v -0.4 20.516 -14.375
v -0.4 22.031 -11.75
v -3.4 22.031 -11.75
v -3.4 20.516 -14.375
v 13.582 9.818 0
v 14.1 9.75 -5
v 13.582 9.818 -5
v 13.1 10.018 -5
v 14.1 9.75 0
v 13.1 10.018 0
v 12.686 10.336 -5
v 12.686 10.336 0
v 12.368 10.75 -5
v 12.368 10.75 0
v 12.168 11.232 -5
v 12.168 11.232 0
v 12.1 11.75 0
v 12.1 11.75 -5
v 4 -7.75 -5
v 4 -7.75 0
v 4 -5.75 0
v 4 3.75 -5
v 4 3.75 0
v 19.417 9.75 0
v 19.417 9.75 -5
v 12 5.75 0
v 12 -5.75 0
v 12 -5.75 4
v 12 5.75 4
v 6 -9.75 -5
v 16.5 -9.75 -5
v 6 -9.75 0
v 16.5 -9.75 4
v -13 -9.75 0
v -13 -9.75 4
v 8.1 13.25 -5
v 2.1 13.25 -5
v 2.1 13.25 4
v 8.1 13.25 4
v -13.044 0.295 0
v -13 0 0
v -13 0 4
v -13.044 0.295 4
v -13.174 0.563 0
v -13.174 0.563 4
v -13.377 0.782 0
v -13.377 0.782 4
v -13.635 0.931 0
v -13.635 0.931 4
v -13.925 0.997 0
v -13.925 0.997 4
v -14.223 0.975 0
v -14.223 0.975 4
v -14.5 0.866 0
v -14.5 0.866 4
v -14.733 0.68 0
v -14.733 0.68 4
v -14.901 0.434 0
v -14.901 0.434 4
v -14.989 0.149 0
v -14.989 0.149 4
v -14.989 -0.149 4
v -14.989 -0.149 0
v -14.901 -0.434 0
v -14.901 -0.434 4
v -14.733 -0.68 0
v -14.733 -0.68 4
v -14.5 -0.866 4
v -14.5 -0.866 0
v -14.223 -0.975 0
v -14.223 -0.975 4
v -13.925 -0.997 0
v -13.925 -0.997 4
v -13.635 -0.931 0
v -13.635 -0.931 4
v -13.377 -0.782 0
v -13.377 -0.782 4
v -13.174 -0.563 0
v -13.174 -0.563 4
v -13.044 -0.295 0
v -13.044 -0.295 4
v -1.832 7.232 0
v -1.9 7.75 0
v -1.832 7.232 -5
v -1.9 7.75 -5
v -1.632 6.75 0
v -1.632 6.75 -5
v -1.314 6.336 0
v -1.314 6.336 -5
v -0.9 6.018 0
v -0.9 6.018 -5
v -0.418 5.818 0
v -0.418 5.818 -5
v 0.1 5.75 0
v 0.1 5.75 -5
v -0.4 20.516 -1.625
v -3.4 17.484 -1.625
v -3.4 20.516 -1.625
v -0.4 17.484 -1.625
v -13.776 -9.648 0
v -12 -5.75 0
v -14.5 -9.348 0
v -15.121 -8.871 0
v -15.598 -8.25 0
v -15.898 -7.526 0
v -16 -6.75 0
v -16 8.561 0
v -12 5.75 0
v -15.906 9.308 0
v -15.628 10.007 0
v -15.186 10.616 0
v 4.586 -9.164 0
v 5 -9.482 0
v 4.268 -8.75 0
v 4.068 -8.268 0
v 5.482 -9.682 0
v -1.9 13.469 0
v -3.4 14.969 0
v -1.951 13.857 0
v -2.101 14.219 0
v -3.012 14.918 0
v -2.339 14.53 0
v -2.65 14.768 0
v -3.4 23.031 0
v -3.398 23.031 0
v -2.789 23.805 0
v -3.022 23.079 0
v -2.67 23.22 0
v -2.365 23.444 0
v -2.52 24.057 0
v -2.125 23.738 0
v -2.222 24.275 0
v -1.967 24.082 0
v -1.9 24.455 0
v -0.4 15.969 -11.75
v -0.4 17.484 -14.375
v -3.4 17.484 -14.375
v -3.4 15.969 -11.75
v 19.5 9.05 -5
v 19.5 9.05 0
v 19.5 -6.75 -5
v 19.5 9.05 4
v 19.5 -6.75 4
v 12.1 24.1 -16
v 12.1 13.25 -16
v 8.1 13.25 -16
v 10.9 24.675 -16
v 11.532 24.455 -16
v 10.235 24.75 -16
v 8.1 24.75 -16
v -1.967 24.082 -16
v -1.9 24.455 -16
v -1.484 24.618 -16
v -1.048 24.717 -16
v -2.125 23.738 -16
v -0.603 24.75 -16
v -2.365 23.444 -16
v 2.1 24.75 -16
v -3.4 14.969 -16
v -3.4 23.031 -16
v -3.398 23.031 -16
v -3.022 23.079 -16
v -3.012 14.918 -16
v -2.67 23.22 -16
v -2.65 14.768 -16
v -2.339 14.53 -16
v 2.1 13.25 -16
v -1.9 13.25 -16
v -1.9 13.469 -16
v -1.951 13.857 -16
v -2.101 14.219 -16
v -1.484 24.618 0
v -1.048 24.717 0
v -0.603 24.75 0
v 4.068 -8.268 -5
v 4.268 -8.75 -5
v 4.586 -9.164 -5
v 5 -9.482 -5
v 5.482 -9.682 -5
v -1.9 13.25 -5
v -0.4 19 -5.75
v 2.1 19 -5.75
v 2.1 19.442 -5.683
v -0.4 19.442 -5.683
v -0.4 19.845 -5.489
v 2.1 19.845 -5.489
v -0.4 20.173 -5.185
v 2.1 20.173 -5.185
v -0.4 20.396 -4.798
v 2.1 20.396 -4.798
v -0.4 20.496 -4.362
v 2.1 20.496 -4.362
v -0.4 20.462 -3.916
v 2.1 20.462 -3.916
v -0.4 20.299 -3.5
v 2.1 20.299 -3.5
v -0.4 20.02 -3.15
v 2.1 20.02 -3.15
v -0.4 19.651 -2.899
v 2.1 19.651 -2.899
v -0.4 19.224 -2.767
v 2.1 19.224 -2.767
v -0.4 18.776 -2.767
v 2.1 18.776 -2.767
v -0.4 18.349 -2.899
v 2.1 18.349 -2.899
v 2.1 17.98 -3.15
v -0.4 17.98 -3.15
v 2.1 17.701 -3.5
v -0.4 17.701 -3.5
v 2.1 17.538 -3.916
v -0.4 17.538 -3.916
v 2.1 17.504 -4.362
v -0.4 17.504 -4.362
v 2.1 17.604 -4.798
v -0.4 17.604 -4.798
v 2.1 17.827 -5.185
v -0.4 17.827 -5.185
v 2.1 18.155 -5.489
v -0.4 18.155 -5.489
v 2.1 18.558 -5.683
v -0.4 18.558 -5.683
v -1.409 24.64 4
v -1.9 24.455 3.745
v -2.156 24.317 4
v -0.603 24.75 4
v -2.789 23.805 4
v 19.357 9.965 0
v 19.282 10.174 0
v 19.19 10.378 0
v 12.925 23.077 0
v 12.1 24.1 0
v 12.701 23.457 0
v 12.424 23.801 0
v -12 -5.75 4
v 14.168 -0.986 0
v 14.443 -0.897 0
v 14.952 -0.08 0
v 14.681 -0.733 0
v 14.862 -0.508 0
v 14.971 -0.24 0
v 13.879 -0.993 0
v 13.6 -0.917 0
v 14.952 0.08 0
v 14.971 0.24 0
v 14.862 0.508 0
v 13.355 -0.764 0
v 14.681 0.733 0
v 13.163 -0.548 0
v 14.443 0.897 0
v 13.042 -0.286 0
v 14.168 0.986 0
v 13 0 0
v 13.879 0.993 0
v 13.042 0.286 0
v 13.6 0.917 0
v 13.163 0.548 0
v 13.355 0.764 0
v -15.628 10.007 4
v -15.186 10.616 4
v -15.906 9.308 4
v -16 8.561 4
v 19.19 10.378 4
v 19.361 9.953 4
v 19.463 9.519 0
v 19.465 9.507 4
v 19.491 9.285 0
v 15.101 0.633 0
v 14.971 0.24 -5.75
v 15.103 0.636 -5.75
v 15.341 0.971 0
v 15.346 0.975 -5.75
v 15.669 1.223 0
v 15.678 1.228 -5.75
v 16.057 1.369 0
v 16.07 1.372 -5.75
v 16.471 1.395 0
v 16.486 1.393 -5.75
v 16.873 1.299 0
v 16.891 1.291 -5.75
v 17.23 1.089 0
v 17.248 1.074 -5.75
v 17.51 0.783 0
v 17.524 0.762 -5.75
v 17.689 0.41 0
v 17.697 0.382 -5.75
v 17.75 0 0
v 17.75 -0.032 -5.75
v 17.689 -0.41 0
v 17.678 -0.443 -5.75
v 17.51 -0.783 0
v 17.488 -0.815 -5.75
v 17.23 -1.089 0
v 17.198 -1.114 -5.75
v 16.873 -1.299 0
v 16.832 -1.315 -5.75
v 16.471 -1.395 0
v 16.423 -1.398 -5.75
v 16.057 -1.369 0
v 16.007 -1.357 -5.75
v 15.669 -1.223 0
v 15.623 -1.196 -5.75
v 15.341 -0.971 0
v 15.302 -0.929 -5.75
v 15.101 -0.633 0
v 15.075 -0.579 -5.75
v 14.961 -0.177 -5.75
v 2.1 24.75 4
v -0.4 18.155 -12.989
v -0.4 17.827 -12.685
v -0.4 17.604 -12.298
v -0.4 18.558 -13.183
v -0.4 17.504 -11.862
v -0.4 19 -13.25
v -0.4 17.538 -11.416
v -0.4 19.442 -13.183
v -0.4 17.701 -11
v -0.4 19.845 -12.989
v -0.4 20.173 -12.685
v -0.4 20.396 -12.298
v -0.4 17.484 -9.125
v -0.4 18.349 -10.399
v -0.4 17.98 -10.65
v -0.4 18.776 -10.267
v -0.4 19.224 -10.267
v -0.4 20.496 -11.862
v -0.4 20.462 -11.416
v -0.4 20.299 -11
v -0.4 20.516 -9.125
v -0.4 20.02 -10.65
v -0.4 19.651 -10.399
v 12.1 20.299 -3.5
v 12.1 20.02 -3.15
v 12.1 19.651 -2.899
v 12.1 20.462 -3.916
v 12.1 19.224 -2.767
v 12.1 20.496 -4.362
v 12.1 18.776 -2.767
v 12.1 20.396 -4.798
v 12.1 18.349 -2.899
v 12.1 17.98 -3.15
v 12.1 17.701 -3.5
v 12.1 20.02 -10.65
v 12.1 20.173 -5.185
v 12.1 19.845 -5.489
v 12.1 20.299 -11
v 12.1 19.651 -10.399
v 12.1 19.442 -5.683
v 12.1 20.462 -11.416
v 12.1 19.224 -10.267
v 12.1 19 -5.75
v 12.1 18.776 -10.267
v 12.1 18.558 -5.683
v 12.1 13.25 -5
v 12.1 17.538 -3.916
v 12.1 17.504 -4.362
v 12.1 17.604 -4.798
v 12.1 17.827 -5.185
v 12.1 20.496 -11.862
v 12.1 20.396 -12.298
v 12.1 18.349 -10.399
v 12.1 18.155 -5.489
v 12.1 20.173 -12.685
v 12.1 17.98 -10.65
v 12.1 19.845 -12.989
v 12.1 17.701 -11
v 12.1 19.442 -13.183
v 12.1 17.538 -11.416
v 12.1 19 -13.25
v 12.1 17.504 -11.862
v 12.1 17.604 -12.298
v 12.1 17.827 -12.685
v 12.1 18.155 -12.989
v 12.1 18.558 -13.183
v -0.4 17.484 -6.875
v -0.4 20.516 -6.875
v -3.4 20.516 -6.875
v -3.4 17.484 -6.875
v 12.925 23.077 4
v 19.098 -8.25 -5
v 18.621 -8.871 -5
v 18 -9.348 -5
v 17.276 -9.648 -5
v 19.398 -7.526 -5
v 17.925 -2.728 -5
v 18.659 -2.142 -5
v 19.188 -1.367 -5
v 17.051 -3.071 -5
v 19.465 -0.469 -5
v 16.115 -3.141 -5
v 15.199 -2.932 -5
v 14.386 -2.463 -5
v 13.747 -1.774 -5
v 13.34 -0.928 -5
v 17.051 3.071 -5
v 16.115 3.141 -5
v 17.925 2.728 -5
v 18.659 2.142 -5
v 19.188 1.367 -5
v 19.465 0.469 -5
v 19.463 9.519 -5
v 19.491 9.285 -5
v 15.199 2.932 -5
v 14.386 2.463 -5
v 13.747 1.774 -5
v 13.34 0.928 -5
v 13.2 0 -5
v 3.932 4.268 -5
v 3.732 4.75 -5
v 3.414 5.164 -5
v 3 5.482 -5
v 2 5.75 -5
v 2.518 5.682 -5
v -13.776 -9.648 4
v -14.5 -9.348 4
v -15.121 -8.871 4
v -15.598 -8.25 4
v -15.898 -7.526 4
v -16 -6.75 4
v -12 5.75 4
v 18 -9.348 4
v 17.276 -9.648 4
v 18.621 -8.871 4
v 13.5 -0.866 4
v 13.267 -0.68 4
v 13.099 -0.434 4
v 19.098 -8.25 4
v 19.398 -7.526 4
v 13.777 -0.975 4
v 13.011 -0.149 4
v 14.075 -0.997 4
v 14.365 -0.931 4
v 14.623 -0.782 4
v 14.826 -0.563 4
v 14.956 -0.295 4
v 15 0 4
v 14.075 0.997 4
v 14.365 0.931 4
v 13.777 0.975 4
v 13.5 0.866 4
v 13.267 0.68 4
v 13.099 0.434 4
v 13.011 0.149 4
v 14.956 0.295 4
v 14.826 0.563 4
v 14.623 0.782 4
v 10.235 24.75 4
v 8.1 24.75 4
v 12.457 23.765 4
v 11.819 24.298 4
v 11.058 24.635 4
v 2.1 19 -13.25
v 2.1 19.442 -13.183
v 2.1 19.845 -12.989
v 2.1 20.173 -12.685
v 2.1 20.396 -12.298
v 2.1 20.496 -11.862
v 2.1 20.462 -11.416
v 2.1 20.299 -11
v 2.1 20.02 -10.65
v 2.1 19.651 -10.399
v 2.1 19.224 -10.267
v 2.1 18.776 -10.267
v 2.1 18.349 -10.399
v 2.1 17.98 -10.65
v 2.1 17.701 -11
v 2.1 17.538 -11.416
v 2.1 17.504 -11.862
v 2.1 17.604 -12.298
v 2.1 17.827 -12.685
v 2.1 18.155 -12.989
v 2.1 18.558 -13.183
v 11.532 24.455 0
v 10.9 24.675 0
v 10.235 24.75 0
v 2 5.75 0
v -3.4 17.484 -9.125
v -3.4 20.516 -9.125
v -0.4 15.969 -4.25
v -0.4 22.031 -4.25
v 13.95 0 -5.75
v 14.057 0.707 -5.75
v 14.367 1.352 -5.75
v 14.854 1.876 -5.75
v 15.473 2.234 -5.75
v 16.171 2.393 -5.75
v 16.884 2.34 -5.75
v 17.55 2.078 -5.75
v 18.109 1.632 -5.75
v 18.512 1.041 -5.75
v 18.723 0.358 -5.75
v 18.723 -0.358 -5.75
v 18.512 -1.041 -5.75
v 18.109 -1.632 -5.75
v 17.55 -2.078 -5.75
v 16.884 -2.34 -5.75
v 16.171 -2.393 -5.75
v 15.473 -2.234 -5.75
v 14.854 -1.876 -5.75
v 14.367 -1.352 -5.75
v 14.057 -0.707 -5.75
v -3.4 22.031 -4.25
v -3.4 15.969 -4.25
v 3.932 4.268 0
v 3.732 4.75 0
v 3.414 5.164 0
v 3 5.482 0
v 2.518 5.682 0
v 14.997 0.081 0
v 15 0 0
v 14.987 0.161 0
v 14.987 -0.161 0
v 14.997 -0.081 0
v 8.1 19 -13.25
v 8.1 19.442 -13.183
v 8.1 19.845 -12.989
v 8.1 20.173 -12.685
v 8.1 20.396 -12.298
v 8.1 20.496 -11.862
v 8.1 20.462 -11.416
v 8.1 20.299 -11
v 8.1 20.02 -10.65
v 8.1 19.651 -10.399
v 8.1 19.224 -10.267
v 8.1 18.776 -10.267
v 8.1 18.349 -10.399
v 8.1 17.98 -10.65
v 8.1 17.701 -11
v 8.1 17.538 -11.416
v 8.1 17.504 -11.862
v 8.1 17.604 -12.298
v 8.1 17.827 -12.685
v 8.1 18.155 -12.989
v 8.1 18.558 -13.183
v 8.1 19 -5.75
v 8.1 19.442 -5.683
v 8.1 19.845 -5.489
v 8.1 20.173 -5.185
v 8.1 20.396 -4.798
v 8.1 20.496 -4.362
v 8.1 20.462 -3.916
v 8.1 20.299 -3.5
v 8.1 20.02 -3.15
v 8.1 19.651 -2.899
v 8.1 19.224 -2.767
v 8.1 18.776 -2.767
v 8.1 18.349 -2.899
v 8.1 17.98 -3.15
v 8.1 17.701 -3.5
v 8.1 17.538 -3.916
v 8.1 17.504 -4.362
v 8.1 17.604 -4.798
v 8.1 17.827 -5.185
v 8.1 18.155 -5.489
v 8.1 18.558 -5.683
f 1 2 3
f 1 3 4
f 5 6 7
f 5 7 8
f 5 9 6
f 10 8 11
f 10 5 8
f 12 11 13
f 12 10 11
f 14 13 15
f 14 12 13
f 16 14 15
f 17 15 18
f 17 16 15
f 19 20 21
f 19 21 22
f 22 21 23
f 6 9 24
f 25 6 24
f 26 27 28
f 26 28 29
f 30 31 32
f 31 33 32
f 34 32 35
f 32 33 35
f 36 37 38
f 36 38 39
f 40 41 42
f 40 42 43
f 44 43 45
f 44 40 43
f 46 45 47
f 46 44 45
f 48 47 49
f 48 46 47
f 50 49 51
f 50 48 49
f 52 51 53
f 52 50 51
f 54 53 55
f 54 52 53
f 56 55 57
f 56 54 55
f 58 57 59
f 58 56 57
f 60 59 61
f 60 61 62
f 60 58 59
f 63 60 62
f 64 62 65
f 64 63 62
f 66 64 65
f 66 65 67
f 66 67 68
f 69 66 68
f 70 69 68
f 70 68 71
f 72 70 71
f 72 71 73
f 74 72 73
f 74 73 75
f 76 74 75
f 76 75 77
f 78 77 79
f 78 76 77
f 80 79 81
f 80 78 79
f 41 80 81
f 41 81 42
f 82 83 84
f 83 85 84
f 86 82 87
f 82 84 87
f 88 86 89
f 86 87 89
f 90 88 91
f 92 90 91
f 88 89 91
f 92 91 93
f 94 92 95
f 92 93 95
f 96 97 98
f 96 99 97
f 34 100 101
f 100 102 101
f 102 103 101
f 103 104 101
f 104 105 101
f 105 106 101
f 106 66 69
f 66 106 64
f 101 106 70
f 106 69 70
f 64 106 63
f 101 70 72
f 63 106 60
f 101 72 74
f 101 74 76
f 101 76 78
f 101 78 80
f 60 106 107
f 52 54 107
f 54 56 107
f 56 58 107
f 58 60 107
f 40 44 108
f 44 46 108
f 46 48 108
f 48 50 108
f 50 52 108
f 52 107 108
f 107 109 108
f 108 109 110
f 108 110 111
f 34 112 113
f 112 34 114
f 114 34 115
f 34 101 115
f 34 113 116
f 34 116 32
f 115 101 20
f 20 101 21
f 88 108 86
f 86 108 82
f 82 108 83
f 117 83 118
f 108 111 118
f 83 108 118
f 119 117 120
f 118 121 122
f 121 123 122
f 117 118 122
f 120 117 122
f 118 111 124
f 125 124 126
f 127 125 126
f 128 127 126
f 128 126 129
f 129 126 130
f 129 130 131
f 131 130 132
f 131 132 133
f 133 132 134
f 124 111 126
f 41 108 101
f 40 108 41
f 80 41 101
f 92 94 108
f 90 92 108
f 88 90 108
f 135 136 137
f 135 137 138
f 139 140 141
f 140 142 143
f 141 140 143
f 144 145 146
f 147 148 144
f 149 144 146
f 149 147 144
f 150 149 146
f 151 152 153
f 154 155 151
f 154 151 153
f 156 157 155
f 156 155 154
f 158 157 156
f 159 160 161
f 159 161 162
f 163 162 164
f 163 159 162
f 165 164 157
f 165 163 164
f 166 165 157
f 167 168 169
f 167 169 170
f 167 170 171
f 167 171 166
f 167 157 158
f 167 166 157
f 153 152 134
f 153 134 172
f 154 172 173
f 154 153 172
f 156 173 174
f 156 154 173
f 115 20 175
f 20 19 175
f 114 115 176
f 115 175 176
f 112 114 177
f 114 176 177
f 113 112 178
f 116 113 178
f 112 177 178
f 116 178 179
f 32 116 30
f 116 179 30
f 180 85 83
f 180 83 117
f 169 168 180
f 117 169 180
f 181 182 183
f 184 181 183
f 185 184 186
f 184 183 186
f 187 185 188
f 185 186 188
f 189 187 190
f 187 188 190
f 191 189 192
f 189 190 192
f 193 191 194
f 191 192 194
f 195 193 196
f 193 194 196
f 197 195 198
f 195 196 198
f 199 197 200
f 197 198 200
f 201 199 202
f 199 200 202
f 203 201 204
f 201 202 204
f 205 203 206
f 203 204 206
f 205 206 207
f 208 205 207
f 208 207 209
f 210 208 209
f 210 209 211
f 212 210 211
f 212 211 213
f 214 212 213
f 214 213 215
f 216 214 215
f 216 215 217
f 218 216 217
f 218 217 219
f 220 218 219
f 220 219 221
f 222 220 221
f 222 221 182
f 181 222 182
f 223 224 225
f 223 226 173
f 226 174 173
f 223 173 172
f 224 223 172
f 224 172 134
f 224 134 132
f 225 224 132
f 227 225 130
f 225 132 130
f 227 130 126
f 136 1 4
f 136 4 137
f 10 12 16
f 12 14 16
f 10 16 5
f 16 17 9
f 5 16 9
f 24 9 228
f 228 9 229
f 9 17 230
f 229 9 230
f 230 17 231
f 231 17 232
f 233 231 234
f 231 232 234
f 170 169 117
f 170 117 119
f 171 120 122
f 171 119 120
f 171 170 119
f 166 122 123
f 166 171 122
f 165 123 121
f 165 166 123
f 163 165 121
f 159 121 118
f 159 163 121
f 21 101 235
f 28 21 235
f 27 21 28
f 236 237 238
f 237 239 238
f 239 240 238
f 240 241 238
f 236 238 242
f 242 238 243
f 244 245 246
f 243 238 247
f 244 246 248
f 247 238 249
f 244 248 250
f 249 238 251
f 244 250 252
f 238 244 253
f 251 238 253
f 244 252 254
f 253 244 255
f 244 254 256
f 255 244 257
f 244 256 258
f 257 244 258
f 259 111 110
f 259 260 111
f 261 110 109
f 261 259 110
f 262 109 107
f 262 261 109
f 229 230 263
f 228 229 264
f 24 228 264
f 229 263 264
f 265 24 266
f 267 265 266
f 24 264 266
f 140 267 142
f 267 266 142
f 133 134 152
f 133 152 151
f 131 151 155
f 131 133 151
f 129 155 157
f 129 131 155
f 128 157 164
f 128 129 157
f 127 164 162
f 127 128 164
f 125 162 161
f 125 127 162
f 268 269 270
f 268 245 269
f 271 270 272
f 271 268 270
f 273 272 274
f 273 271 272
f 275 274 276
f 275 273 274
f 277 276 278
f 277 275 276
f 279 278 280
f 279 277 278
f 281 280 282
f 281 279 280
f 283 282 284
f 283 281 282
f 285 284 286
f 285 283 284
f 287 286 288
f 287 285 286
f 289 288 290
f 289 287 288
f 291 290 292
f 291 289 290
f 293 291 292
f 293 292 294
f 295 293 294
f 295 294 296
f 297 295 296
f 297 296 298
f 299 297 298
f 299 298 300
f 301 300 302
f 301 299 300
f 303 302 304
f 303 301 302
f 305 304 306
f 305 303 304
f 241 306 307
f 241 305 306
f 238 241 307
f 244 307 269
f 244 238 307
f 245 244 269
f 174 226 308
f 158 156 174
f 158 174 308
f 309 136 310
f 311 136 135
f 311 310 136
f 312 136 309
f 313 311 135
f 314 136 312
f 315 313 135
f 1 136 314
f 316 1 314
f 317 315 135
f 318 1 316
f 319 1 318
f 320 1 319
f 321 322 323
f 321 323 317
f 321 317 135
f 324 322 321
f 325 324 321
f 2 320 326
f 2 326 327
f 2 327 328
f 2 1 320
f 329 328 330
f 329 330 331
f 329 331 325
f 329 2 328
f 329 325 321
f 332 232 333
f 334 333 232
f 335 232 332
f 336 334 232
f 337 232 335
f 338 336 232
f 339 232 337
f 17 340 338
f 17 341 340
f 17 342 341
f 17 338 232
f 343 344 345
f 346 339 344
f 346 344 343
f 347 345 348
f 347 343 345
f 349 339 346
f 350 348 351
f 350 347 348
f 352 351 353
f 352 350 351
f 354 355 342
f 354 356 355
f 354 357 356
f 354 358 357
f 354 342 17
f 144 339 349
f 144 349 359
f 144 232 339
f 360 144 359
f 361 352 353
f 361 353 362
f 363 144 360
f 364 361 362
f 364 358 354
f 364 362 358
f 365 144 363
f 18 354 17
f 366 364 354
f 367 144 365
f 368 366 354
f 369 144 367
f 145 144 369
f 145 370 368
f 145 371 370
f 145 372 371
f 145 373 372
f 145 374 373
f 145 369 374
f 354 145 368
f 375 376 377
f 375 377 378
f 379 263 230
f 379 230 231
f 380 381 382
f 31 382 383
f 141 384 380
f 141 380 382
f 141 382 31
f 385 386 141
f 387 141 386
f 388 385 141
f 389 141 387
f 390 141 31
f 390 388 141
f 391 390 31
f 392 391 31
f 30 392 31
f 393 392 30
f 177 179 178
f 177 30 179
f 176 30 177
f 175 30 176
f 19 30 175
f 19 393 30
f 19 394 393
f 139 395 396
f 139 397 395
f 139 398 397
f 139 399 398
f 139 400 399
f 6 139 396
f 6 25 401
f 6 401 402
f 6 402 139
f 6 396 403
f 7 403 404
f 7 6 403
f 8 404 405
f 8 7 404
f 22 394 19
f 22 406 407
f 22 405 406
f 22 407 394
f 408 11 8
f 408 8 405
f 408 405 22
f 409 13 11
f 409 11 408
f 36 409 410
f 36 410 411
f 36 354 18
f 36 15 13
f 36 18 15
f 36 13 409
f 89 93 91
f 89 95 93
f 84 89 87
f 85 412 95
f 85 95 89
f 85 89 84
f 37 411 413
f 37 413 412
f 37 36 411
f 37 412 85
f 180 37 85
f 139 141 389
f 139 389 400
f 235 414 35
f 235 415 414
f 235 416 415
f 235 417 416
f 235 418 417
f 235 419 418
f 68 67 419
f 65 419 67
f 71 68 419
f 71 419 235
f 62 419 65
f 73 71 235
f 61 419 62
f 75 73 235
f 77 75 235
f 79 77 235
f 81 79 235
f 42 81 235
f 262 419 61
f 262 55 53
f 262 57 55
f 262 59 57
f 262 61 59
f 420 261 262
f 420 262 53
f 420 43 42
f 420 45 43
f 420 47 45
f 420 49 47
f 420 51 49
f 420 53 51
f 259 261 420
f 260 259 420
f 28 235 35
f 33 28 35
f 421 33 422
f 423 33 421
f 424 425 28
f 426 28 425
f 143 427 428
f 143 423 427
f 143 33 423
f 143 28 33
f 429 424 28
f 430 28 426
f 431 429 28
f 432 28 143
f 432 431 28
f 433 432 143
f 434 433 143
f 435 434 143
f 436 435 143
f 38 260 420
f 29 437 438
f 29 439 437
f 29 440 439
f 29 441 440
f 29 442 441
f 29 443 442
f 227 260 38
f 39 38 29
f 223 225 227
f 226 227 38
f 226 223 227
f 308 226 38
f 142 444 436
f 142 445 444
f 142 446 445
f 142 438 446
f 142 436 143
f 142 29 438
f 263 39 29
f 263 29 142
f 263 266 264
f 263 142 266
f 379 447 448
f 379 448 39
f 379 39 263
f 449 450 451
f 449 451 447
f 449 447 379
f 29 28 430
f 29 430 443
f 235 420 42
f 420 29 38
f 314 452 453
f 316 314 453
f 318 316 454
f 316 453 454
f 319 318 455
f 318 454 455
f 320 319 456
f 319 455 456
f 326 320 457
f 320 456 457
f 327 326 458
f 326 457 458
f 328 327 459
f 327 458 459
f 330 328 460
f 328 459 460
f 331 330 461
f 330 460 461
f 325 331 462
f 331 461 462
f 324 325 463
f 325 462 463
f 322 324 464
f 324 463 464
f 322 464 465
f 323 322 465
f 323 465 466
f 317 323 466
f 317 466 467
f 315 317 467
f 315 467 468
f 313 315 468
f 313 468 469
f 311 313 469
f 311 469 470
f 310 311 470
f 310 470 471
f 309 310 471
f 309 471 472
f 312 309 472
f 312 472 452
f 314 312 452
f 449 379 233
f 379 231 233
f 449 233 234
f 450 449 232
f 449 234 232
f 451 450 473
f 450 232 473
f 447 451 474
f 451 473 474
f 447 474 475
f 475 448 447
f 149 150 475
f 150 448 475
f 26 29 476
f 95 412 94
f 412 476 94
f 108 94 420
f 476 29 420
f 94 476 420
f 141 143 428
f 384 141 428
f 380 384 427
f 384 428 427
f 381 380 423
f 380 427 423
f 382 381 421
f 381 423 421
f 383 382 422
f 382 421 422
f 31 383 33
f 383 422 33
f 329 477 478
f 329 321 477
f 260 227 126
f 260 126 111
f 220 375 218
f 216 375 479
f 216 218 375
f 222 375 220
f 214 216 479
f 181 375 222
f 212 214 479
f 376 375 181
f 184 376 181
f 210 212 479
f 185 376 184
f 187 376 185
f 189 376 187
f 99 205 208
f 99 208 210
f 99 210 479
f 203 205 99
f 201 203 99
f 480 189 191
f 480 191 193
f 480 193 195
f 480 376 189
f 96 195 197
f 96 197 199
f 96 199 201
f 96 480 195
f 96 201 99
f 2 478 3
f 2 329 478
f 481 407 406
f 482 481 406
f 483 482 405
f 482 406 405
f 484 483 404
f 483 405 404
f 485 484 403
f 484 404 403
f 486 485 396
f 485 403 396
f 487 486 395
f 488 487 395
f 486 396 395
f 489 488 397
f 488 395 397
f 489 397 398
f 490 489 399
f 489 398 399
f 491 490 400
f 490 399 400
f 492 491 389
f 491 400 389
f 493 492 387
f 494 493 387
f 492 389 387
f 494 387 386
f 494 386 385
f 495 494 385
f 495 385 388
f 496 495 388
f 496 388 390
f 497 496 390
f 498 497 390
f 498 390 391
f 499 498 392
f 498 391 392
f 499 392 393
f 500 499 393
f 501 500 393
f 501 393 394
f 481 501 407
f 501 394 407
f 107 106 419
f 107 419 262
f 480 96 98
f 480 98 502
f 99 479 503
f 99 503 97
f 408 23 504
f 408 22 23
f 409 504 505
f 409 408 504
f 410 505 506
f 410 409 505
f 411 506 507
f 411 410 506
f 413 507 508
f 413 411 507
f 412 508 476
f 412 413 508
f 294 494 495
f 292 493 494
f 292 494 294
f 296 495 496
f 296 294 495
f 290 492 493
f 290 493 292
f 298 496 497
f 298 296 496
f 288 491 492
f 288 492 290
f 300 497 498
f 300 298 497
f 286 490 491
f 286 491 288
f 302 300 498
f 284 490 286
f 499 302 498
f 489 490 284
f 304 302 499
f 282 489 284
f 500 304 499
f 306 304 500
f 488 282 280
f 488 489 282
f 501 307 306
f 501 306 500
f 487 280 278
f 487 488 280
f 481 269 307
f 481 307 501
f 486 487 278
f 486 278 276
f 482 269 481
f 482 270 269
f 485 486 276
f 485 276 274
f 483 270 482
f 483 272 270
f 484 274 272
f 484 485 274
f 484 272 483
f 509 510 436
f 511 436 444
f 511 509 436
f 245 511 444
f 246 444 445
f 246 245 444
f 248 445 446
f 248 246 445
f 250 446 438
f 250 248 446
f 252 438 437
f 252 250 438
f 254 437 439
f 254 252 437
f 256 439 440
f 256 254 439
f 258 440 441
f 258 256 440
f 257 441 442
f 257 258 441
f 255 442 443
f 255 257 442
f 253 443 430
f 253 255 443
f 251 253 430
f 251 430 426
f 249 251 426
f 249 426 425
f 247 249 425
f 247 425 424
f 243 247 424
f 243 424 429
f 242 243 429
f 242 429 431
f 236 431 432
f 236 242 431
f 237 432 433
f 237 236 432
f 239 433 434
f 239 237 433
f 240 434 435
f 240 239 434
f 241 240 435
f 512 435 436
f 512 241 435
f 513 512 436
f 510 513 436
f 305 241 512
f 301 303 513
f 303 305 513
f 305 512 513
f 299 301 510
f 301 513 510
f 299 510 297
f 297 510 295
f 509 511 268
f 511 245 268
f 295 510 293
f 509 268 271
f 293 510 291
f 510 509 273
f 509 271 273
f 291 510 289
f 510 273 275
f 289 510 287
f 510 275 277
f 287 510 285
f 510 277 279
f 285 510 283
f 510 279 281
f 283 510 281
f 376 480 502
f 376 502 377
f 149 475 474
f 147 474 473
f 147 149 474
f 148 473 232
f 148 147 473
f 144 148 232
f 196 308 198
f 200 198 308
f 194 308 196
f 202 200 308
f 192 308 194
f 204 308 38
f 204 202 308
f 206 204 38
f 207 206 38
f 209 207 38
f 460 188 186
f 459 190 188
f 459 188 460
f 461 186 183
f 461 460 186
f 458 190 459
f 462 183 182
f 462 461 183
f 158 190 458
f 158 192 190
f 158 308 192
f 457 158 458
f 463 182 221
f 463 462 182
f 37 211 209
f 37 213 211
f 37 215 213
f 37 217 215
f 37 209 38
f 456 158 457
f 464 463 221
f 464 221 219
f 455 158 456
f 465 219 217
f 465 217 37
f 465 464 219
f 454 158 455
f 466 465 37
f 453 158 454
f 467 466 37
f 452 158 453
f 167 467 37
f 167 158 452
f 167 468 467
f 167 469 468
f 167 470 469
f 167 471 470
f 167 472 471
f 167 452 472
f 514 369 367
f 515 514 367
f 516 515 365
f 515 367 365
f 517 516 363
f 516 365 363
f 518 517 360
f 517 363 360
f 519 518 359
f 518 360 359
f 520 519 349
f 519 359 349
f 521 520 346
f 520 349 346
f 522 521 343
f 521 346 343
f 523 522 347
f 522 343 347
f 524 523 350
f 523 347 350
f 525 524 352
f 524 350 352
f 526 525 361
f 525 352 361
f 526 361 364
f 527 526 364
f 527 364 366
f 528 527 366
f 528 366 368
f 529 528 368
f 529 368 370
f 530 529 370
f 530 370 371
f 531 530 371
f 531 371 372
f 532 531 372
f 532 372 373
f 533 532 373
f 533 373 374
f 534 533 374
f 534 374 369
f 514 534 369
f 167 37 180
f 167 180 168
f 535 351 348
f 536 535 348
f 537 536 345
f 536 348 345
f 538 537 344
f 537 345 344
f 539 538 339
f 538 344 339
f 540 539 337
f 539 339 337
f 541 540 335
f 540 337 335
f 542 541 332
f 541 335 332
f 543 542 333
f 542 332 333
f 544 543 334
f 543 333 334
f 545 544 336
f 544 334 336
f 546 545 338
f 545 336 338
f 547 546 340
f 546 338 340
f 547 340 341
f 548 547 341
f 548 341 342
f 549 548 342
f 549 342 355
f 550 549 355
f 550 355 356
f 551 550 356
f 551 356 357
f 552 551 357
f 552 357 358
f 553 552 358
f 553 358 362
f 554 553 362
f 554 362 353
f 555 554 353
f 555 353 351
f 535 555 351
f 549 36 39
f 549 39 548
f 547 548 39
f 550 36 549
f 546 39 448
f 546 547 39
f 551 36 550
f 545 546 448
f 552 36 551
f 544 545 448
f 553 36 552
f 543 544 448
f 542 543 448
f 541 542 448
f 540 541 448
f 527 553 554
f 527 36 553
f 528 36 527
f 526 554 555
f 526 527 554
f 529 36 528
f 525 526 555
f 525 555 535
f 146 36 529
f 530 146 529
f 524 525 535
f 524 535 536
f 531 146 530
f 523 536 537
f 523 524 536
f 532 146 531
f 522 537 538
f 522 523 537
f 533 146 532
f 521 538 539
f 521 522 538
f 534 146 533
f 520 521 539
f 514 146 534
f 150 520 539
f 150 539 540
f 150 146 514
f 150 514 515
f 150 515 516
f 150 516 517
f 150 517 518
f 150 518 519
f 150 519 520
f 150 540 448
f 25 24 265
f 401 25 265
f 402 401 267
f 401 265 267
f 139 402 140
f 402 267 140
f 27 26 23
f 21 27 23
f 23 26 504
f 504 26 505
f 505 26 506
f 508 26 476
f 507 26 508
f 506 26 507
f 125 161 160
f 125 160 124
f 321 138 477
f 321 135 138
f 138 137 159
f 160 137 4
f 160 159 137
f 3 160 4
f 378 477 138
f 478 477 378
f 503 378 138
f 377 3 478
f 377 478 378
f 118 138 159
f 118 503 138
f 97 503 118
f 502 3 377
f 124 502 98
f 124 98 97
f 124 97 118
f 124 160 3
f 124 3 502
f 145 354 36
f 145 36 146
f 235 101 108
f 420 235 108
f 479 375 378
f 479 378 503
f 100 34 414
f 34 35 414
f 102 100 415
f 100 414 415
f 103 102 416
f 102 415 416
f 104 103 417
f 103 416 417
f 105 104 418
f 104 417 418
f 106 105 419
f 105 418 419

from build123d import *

# Parameters (mm, degrees)
SKETCH_1_W          = 32
SKETCH_1_H          = 19.5
SKETCH_1_R          = 1
SKETCH_1_W_2        = 24
SKETCH_1_H_2        = 11.5
SKETCH_1_W_3        = 3.5
EXTRUDE_1_DEPTH     = 4
SKETCH_4_W          = 3
SKETCH_4_H          = 3.5
EXTRUDE_3_DEPTH     = 4
FILLET_2_R          = 3
SKETCH_9_R          = 1.4
EXTRUDE_5_DEPTH     = 5
EXTRUDE_START       = 16
EXTRUDE_6_DEPTH     = 16
SKETCH_12_R         = 2.4
SKETCH_12_R_2       = 1.4
EXTRUDE_7_DEPTH     = 0.75
CHAMFER_4_SIZE      = 0.75
SKETCH_11_R         = 1.5
SKETCH_11_W         = 11
SKETCH_11_H         = 3.5
CUT_EXTRUDE_2_DEPTH = 41.720664287
FILLET_7_R          = 2
CUT_EXTRUDE_START   = -1.5
SKETCH_13_R         = 1.5
CUT_EXTRUDE_4_DEPTH = 1.5
SKETCH_15_W         = 16
SKETCH_15_H         = 8.062177826
EXTRUDE_9_DEPTH     = 1.5
FILLET_8_R          = 1.5


# Some blends are built 0.0001 mm under size
with BuildPart() as part:
    # Эскиз1 → Бобышка-Вытянуть1 (new body)
    # profile 1 of 2: a face of its own
    with BuildSketch(Plane.XY):
        Rectangle(SKETCH_1_W, SKETCH_1_H)
        with Locations((-14, 0)):
            Circle(SKETCH_1_R, mode=Mode.SUBTRACT)
        with Locations((14, 0)):
            Circle(SKETCH_1_R, mode=Mode.SUBTRACT)
        Rectangle(SKETCH_1_W_2, SKETCH_1_H_2, mode=Mode.SUBTRACT)
    # profile 2 of 2: a face of its own
    with BuildSketch(Plane.XY):
        with Locations((17.75, 0)):
            Rectangle(SKETCH_1_W_3, SKETCH_1_H)
    extrude(amount=EXTRUDE_1_DEPTH)

    # Эскиз4 → Бобышка-Вытянуть3 (add)
    with BuildSketch(Plane.XY.offset(4)):
        Polygon((-16, 9.75), (-1.9, 9.75), (-1.9, 24.75), align=None)
        Polygon((-1.9, 9.75), (2.1, 9.75), (2.1, 13.25), (2.1, 24.75), (-1.9, 24.75), align=None)
        Polygon((8.1, 13.25), (8.1, 9.75), (12.1, 9.75), (12.1, 24.75), (8.1, 24.75), align=None)
        Polygon((12.1, 24.75), (12.1, 9.75), (19.5, 9.75), align=None)
        with Locations((3.6, 11.5)):
            Rectangle(SKETCH_4_W, SKETCH_4_H)
        with Locations((6.6, 11.5)):
            Rectangle(SKETCH_4_W, SKETCH_4_H)
    extrude(amount=-EXTRUDE_3_DEPTH)

    # Скругление2
    fillet_2_edges = [part.edges().sort_by_distance(p)[0] for p in [
        (-16, 9.75, 2),
        (19.5, 9.75, 2),
        (19.5, -9.75, 2),
        (-16, -9.75, 2),
        (-1.9, 24.75, 2),
        (12.1, 24.75, 2),
    ]]
    fillet(fillet_2_edges, radius=FILLET_2_R)

    # Эскиз9 → Бобышка-Вытянуть5 (add)
    with BuildSketch(Plane(origin=(0, 0, 0), x_dir=(-1, 0, 0), z_dir=(0, 0, -1))):
        with BuildLine():
            ThreePointArc((-19.5, -6.75), (-18.621320344, -8.871320344), (-16.5, -9.75))
            Line((-16.5, -9.75), (-4, -9.75))
            Line((-4, -9.75), (-4, 5.75))
            Line((-4, 5.75), (1.9, 5.75))
            Line((1.9, 5.75), (1.9, 9.75))
            Line((1.9, 9.75), (-19.417252583, 9.75))
            ThreePointArc((-19.417252583, 9.75), (-19.479241325, 9.402567354), (-19.5, 9.050259072))
            Line((-19.5, 9.050259072), (-19.5, -6.75))
        make_face()
        with Locations(Location((-16.35, 0, 0), (0, 0, 9.875627991))):
            Circle(SKETCH_9_R, mode=Mode.SUBTRACT)
    extrude(amount=EXTRUDE_5_DEPTH)

    # Эскиз10 → Бобышка-Вытянуть6 (add)
    with BuildSketch(Plane(origin=(0, 0, 0), x_dir=(-1, 0, 0), z_dir=(0, 0, -1)).offset(EXTRUDE_START)):
        with BuildLine():
            Line((-8.1, 24.75), (-10.234794476, 24.75))
            ThreePointArc((-10.234794476, 24.75), (-11.222456407, 24.582759063), (-12.1, 24.099682607))
            Line((-12.1, 24.099682607), (-12.1, 9.75))
            Line((-12.1, 9.75), (1.9, 9.75))
            Line((1.9, 9.75), (1.9, 24.454983709))
            ThreePointArc((1.9, 24.454983709), (1.267895871, 24.675316319), (0.602670769, 24.75))
            Line((0.602670769, 24.75), (-2.1, 24.75))
            Line((-2.1, 24.75), (-2.1, 13.25))
            Line((-2.1, 13.25), (-8.1, 13.25))
            Line((-8.1, 13.25), (-8.1, 24.75))
        make_face()
    extrude(amount=-EXTRUDE_6_DEPTH)

    # Эскиз12 → Бобышка-Вытянуть7 (add)
    with BuildSketch(Plane(origin=(0, 0, -5), x_dir=(-1, 0, 0), z_dir=(0, 0, -1))):
        with Locations((-16.35, 0)):
            Circle(SKETCH_12_R)
        with Locations(Location((-16.35, 0, 0), (0, 0, 9.875627991))):
            Circle(SKETCH_12_R_2, mode=Mode.SUBTRACT)
    extrude(amount=EXTRUDE_7_DEPTH)

    # Фаска4
    chamfer_4_edges = [part.edges().sort_by_distance(p)[0] for p in [
        (18.75, 0, -5),
    ]]
    chamfer(chamfer_4_edges, length=CHAMFER_4_SIZE - 0.0001)  # a hair under: the kernel refuses the full size

    # Эскиз11 → Вырез-Вытянуть2 (cut, through all)
    with BuildSketch(Plane(origin=(12.1, 0, 0), x_dir=(0, 0, -1), z_dir=(1, 0, 0))):
        with Locations((4.25, 19)):
            Circle(SKETCH_11_R)
        with Locations((11.75, 19)):
            Circle(SKETCH_11_R)
        with Locations((10.5, 11.5)):
            Rectangle(SKETCH_11_W, SKETCH_11_H)
    extrude(amount=-CUT_EXTRUDE_2_DEPTH, mode=Mode.SUBTRACT)

    # Скругление7
    fillet_7_edges = [part.edges().sort_by_distance(p)[0] for p in [
        (4, -9.75, -2.5),
        (4, 5.75, -2.5),
        (-1.9, 5.75, -2.5),
        (12.1, 9.75, -2.5),
    ]]
    fillet(fillet_7_edges, radius=FILLET_7_R)

    # Эскиз13 → Вырез-Вытянуть4 (cut)
    # profile 1 of 2: a face of its own
    with BuildSketch(Plane.ZY.offset(1.9).offset(CUT_EXTRUDE_START)):
        Polygon((-11.75, 15.968911087), (-9.125, 17.484455543), (-9.125, 20.515544457), (-11.75, 22.031088913), (-14.375, 20.515544457), (-14.375, 17.484455543), align=None)
        with Locations(Location((-11.75, 19, 0), (0, 0, 90))):
            Circle(SKETCH_13_R, mode=Mode.SUBTRACT)
    # profile 2 of 2: a face of its own
    with BuildSketch(Plane.ZY.offset(1.9).offset(CUT_EXTRUDE_START)):
        Polygon((-1.625, 17.484455543), (-1.625, 20.515544457), (-4.25, 22.031088913), (-6.875, 20.515544457), (-6.875, 17.484455543), (-4.25, 15.968911087), align=None)
        with Locations(Location((-4.25, 19, 0), (0, 0, 90))):
            Circle(SKETCH_13_R, mode=Mode.SUBTRACT)
    extrude(amount=CUT_EXTRUDE_4_DEPTH, mode=Mode.SUBTRACT)

    # Эскиз15 → Бобышка-Вытянуть9 (add)
    with BuildSketch(Plane.ZY.offset(1.9)):
        with Locations((-8, 19)):
            Rectangle(SKETCH_15_W, SKETCH_15_H)
        Polygon((-9.125, 20.515544457), (-11.75, 22.031088913), (-14.375, 20.515544457), (-14.375, 17.484455543), (-11.75, 15.968911087), (-9.125, 17.484455543), align=None, mode=Mode.SUBTRACT)
        Polygon((-1.625, 17.484455543), (-1.625, 20.515544457), (-4.25, 22.031088913), (-6.875, 20.515544457), (-6.875, 17.484455543), (-4.25, 15.968911087), align=None, mode=Mode.SUBTRACT)
    extrude(amount=EXTRUDE_9_DEPTH)

    # Скругление8
    # the kernel refuses this fillet: 1.5 mm, written as the material it adds along each edge
    with BuildSketch(Plane(origin=(-1.9, 14.968911087, -16), x_dir=(-1, 0, 0), z_dir=(0, 0, 1))) as fillet_8_piece_1:
        with BuildLine():
            CenterArc((FILLET_8_R, FILLET_8_R), FILLET_8_R, 180, 90)
            Line((0, FILLET_8_R), (-FILLET_8_R * 0.02, FILLET_8_R))
            Line((-FILLET_8_R * 0.02, FILLET_8_R), (-FILLET_8_R * 0.02, -FILLET_8_R * 0.02))
            Line((-FILLET_8_R * 0.02, -FILLET_8_R * 0.02), (FILLET_8_R, -FILLET_8_R * 0.02))
            Line((FILLET_8_R, -FILLET_8_R * 0.02), (FILLET_8_R, 0))
        make_face()
    extrude(amount=19.75)
    with BuildSketch(Plane(origin=(-1.9, 23.031088913, 3.745170221), x_dir=(0, 1, 0), z_dir=(0, 0, -1))) as fillet_8_piece_2:
        with BuildLine():
            CenterArc((1.5, -1.498068089), FILLET_8_R, 92.908253333, 87.091746667)
            Line((0, -1.498068089), (-0.03, -1.498068089))
            Line((-0.03, -1.498068089), (-0.03, 0))
            Line((-0.03, 0), (0, 0.03))
            ThreePointArc((0, 0.03), (0.711947398, 0.03), (1.422372692, 0.029961362))
            Line((1.422372692, 0.029961362), (1.423894796, 0))
        make_face()
    extrude(amount=19.745170221)


solid = part.part
